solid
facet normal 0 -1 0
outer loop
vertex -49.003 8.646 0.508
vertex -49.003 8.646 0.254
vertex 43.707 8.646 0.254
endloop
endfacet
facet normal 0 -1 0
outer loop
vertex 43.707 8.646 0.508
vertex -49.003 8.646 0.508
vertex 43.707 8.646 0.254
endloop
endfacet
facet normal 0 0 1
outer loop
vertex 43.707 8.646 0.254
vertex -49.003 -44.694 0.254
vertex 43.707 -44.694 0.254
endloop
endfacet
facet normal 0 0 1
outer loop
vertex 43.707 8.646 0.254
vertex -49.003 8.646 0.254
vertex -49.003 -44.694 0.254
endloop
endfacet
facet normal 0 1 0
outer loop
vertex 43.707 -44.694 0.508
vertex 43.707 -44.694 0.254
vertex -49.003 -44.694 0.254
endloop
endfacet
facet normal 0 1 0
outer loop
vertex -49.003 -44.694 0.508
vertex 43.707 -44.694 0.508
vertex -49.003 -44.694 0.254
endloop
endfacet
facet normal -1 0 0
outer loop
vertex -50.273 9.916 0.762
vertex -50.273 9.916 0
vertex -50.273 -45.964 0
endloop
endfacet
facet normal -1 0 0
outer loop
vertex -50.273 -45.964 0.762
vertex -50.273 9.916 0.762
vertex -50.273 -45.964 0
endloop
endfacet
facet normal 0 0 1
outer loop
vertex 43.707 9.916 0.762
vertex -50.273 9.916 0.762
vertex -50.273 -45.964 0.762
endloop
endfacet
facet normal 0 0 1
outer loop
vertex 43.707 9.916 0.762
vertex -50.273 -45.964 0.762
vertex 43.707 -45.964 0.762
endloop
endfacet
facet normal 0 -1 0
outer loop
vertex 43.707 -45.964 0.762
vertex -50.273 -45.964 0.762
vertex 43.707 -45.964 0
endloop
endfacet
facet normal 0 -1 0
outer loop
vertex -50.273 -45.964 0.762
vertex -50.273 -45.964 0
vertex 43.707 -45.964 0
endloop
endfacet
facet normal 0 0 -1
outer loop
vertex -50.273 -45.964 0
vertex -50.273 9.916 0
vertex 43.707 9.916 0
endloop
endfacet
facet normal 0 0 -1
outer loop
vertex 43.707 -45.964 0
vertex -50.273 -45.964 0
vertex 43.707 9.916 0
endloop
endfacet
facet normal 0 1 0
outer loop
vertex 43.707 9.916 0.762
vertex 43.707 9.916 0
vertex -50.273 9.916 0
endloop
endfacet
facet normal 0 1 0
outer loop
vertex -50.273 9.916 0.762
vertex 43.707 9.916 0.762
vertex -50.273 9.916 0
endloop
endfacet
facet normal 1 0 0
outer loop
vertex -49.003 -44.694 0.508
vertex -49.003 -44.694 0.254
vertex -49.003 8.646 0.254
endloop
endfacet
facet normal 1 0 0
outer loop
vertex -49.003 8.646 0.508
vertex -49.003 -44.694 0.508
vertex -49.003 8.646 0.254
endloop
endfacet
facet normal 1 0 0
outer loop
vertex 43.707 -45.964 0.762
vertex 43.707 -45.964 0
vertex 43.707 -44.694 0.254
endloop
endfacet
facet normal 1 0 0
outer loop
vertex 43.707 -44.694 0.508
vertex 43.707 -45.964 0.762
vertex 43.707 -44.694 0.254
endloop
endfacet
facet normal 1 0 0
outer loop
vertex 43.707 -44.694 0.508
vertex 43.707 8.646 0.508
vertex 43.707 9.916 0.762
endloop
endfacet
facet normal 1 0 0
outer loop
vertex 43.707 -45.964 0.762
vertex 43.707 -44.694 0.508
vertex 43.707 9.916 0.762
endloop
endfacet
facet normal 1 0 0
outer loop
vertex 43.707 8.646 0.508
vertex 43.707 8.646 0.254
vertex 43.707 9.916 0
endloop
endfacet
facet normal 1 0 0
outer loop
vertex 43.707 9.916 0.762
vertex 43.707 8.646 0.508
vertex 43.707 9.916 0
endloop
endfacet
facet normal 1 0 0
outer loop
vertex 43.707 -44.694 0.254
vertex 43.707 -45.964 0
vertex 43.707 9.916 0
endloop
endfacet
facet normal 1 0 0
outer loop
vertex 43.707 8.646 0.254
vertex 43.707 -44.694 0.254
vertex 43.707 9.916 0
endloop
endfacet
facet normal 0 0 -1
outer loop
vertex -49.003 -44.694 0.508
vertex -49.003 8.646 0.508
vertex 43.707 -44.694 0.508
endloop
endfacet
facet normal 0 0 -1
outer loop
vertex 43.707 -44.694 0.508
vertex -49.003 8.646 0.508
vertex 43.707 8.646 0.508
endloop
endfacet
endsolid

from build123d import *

# Parameters (mm, degrees)
F0_W     = 93.98
F0_H     = 55.88
F1_DEPTH = 0.254
F3_DEPTH = 0.254
F5_DEPTH = 0.254


with BuildPart() as f1:
    # F0 (on Top) → F1 (new body)
    with BuildSketch(Plane.XY):
        with Locations((-3.283079, -18.023962)):
            Rectangle(F0_W, F0_H)
    extrude(amount=F1_DEPTH)

    # F2 (on face) → F3 (join)
    with BuildSketch(Plane.XY.offset(0.254)):
        Polygon((43.706921, 9.916038), (-50.273079, 9.916038), (-50.273079, -45.963962), (43.706921, -45.963962), (43.706921, -44.693962), (-49.003079, -44.693962), (-49.003079, 8.646038), (43.706921, 8.646038), align=None)
    extrude(amount=F3_DEPTH)

    # F4 (on face) → F5 (join)
    with BuildSketch(Plane.XY.offset(0.508)):
        Polygon((-50.273079, 9.916038), (-50.273079, -45.963962), (43.706921, -45.963962), (43.706921, -44.693962), (43.706921, 8.646038), (43.706921, 9.916038), align=None)
    extrude(amount=F5_DEPTH)


solid = f1.part
